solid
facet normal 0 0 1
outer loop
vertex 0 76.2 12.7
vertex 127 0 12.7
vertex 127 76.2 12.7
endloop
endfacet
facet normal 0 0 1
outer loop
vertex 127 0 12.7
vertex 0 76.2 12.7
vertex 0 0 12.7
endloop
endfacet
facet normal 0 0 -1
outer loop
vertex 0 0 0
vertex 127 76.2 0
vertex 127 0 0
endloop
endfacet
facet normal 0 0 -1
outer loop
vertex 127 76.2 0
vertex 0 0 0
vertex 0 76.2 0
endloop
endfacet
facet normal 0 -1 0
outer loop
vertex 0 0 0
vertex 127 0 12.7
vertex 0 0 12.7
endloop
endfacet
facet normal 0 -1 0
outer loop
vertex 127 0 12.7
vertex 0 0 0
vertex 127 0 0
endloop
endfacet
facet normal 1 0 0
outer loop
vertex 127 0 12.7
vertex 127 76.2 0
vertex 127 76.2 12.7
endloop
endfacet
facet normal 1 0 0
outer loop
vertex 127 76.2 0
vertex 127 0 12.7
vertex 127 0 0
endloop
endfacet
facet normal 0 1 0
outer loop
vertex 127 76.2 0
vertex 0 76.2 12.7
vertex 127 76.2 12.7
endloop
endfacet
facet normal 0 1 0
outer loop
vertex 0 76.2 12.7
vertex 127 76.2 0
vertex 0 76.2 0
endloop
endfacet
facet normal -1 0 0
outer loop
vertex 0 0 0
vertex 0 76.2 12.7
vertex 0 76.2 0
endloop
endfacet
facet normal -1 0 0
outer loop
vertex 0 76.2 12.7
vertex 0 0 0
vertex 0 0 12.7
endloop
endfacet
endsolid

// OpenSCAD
inch = 25.4;

size = [
    5 * inch,
    3 * inch,
    .5 * inch
];

cube(size);
